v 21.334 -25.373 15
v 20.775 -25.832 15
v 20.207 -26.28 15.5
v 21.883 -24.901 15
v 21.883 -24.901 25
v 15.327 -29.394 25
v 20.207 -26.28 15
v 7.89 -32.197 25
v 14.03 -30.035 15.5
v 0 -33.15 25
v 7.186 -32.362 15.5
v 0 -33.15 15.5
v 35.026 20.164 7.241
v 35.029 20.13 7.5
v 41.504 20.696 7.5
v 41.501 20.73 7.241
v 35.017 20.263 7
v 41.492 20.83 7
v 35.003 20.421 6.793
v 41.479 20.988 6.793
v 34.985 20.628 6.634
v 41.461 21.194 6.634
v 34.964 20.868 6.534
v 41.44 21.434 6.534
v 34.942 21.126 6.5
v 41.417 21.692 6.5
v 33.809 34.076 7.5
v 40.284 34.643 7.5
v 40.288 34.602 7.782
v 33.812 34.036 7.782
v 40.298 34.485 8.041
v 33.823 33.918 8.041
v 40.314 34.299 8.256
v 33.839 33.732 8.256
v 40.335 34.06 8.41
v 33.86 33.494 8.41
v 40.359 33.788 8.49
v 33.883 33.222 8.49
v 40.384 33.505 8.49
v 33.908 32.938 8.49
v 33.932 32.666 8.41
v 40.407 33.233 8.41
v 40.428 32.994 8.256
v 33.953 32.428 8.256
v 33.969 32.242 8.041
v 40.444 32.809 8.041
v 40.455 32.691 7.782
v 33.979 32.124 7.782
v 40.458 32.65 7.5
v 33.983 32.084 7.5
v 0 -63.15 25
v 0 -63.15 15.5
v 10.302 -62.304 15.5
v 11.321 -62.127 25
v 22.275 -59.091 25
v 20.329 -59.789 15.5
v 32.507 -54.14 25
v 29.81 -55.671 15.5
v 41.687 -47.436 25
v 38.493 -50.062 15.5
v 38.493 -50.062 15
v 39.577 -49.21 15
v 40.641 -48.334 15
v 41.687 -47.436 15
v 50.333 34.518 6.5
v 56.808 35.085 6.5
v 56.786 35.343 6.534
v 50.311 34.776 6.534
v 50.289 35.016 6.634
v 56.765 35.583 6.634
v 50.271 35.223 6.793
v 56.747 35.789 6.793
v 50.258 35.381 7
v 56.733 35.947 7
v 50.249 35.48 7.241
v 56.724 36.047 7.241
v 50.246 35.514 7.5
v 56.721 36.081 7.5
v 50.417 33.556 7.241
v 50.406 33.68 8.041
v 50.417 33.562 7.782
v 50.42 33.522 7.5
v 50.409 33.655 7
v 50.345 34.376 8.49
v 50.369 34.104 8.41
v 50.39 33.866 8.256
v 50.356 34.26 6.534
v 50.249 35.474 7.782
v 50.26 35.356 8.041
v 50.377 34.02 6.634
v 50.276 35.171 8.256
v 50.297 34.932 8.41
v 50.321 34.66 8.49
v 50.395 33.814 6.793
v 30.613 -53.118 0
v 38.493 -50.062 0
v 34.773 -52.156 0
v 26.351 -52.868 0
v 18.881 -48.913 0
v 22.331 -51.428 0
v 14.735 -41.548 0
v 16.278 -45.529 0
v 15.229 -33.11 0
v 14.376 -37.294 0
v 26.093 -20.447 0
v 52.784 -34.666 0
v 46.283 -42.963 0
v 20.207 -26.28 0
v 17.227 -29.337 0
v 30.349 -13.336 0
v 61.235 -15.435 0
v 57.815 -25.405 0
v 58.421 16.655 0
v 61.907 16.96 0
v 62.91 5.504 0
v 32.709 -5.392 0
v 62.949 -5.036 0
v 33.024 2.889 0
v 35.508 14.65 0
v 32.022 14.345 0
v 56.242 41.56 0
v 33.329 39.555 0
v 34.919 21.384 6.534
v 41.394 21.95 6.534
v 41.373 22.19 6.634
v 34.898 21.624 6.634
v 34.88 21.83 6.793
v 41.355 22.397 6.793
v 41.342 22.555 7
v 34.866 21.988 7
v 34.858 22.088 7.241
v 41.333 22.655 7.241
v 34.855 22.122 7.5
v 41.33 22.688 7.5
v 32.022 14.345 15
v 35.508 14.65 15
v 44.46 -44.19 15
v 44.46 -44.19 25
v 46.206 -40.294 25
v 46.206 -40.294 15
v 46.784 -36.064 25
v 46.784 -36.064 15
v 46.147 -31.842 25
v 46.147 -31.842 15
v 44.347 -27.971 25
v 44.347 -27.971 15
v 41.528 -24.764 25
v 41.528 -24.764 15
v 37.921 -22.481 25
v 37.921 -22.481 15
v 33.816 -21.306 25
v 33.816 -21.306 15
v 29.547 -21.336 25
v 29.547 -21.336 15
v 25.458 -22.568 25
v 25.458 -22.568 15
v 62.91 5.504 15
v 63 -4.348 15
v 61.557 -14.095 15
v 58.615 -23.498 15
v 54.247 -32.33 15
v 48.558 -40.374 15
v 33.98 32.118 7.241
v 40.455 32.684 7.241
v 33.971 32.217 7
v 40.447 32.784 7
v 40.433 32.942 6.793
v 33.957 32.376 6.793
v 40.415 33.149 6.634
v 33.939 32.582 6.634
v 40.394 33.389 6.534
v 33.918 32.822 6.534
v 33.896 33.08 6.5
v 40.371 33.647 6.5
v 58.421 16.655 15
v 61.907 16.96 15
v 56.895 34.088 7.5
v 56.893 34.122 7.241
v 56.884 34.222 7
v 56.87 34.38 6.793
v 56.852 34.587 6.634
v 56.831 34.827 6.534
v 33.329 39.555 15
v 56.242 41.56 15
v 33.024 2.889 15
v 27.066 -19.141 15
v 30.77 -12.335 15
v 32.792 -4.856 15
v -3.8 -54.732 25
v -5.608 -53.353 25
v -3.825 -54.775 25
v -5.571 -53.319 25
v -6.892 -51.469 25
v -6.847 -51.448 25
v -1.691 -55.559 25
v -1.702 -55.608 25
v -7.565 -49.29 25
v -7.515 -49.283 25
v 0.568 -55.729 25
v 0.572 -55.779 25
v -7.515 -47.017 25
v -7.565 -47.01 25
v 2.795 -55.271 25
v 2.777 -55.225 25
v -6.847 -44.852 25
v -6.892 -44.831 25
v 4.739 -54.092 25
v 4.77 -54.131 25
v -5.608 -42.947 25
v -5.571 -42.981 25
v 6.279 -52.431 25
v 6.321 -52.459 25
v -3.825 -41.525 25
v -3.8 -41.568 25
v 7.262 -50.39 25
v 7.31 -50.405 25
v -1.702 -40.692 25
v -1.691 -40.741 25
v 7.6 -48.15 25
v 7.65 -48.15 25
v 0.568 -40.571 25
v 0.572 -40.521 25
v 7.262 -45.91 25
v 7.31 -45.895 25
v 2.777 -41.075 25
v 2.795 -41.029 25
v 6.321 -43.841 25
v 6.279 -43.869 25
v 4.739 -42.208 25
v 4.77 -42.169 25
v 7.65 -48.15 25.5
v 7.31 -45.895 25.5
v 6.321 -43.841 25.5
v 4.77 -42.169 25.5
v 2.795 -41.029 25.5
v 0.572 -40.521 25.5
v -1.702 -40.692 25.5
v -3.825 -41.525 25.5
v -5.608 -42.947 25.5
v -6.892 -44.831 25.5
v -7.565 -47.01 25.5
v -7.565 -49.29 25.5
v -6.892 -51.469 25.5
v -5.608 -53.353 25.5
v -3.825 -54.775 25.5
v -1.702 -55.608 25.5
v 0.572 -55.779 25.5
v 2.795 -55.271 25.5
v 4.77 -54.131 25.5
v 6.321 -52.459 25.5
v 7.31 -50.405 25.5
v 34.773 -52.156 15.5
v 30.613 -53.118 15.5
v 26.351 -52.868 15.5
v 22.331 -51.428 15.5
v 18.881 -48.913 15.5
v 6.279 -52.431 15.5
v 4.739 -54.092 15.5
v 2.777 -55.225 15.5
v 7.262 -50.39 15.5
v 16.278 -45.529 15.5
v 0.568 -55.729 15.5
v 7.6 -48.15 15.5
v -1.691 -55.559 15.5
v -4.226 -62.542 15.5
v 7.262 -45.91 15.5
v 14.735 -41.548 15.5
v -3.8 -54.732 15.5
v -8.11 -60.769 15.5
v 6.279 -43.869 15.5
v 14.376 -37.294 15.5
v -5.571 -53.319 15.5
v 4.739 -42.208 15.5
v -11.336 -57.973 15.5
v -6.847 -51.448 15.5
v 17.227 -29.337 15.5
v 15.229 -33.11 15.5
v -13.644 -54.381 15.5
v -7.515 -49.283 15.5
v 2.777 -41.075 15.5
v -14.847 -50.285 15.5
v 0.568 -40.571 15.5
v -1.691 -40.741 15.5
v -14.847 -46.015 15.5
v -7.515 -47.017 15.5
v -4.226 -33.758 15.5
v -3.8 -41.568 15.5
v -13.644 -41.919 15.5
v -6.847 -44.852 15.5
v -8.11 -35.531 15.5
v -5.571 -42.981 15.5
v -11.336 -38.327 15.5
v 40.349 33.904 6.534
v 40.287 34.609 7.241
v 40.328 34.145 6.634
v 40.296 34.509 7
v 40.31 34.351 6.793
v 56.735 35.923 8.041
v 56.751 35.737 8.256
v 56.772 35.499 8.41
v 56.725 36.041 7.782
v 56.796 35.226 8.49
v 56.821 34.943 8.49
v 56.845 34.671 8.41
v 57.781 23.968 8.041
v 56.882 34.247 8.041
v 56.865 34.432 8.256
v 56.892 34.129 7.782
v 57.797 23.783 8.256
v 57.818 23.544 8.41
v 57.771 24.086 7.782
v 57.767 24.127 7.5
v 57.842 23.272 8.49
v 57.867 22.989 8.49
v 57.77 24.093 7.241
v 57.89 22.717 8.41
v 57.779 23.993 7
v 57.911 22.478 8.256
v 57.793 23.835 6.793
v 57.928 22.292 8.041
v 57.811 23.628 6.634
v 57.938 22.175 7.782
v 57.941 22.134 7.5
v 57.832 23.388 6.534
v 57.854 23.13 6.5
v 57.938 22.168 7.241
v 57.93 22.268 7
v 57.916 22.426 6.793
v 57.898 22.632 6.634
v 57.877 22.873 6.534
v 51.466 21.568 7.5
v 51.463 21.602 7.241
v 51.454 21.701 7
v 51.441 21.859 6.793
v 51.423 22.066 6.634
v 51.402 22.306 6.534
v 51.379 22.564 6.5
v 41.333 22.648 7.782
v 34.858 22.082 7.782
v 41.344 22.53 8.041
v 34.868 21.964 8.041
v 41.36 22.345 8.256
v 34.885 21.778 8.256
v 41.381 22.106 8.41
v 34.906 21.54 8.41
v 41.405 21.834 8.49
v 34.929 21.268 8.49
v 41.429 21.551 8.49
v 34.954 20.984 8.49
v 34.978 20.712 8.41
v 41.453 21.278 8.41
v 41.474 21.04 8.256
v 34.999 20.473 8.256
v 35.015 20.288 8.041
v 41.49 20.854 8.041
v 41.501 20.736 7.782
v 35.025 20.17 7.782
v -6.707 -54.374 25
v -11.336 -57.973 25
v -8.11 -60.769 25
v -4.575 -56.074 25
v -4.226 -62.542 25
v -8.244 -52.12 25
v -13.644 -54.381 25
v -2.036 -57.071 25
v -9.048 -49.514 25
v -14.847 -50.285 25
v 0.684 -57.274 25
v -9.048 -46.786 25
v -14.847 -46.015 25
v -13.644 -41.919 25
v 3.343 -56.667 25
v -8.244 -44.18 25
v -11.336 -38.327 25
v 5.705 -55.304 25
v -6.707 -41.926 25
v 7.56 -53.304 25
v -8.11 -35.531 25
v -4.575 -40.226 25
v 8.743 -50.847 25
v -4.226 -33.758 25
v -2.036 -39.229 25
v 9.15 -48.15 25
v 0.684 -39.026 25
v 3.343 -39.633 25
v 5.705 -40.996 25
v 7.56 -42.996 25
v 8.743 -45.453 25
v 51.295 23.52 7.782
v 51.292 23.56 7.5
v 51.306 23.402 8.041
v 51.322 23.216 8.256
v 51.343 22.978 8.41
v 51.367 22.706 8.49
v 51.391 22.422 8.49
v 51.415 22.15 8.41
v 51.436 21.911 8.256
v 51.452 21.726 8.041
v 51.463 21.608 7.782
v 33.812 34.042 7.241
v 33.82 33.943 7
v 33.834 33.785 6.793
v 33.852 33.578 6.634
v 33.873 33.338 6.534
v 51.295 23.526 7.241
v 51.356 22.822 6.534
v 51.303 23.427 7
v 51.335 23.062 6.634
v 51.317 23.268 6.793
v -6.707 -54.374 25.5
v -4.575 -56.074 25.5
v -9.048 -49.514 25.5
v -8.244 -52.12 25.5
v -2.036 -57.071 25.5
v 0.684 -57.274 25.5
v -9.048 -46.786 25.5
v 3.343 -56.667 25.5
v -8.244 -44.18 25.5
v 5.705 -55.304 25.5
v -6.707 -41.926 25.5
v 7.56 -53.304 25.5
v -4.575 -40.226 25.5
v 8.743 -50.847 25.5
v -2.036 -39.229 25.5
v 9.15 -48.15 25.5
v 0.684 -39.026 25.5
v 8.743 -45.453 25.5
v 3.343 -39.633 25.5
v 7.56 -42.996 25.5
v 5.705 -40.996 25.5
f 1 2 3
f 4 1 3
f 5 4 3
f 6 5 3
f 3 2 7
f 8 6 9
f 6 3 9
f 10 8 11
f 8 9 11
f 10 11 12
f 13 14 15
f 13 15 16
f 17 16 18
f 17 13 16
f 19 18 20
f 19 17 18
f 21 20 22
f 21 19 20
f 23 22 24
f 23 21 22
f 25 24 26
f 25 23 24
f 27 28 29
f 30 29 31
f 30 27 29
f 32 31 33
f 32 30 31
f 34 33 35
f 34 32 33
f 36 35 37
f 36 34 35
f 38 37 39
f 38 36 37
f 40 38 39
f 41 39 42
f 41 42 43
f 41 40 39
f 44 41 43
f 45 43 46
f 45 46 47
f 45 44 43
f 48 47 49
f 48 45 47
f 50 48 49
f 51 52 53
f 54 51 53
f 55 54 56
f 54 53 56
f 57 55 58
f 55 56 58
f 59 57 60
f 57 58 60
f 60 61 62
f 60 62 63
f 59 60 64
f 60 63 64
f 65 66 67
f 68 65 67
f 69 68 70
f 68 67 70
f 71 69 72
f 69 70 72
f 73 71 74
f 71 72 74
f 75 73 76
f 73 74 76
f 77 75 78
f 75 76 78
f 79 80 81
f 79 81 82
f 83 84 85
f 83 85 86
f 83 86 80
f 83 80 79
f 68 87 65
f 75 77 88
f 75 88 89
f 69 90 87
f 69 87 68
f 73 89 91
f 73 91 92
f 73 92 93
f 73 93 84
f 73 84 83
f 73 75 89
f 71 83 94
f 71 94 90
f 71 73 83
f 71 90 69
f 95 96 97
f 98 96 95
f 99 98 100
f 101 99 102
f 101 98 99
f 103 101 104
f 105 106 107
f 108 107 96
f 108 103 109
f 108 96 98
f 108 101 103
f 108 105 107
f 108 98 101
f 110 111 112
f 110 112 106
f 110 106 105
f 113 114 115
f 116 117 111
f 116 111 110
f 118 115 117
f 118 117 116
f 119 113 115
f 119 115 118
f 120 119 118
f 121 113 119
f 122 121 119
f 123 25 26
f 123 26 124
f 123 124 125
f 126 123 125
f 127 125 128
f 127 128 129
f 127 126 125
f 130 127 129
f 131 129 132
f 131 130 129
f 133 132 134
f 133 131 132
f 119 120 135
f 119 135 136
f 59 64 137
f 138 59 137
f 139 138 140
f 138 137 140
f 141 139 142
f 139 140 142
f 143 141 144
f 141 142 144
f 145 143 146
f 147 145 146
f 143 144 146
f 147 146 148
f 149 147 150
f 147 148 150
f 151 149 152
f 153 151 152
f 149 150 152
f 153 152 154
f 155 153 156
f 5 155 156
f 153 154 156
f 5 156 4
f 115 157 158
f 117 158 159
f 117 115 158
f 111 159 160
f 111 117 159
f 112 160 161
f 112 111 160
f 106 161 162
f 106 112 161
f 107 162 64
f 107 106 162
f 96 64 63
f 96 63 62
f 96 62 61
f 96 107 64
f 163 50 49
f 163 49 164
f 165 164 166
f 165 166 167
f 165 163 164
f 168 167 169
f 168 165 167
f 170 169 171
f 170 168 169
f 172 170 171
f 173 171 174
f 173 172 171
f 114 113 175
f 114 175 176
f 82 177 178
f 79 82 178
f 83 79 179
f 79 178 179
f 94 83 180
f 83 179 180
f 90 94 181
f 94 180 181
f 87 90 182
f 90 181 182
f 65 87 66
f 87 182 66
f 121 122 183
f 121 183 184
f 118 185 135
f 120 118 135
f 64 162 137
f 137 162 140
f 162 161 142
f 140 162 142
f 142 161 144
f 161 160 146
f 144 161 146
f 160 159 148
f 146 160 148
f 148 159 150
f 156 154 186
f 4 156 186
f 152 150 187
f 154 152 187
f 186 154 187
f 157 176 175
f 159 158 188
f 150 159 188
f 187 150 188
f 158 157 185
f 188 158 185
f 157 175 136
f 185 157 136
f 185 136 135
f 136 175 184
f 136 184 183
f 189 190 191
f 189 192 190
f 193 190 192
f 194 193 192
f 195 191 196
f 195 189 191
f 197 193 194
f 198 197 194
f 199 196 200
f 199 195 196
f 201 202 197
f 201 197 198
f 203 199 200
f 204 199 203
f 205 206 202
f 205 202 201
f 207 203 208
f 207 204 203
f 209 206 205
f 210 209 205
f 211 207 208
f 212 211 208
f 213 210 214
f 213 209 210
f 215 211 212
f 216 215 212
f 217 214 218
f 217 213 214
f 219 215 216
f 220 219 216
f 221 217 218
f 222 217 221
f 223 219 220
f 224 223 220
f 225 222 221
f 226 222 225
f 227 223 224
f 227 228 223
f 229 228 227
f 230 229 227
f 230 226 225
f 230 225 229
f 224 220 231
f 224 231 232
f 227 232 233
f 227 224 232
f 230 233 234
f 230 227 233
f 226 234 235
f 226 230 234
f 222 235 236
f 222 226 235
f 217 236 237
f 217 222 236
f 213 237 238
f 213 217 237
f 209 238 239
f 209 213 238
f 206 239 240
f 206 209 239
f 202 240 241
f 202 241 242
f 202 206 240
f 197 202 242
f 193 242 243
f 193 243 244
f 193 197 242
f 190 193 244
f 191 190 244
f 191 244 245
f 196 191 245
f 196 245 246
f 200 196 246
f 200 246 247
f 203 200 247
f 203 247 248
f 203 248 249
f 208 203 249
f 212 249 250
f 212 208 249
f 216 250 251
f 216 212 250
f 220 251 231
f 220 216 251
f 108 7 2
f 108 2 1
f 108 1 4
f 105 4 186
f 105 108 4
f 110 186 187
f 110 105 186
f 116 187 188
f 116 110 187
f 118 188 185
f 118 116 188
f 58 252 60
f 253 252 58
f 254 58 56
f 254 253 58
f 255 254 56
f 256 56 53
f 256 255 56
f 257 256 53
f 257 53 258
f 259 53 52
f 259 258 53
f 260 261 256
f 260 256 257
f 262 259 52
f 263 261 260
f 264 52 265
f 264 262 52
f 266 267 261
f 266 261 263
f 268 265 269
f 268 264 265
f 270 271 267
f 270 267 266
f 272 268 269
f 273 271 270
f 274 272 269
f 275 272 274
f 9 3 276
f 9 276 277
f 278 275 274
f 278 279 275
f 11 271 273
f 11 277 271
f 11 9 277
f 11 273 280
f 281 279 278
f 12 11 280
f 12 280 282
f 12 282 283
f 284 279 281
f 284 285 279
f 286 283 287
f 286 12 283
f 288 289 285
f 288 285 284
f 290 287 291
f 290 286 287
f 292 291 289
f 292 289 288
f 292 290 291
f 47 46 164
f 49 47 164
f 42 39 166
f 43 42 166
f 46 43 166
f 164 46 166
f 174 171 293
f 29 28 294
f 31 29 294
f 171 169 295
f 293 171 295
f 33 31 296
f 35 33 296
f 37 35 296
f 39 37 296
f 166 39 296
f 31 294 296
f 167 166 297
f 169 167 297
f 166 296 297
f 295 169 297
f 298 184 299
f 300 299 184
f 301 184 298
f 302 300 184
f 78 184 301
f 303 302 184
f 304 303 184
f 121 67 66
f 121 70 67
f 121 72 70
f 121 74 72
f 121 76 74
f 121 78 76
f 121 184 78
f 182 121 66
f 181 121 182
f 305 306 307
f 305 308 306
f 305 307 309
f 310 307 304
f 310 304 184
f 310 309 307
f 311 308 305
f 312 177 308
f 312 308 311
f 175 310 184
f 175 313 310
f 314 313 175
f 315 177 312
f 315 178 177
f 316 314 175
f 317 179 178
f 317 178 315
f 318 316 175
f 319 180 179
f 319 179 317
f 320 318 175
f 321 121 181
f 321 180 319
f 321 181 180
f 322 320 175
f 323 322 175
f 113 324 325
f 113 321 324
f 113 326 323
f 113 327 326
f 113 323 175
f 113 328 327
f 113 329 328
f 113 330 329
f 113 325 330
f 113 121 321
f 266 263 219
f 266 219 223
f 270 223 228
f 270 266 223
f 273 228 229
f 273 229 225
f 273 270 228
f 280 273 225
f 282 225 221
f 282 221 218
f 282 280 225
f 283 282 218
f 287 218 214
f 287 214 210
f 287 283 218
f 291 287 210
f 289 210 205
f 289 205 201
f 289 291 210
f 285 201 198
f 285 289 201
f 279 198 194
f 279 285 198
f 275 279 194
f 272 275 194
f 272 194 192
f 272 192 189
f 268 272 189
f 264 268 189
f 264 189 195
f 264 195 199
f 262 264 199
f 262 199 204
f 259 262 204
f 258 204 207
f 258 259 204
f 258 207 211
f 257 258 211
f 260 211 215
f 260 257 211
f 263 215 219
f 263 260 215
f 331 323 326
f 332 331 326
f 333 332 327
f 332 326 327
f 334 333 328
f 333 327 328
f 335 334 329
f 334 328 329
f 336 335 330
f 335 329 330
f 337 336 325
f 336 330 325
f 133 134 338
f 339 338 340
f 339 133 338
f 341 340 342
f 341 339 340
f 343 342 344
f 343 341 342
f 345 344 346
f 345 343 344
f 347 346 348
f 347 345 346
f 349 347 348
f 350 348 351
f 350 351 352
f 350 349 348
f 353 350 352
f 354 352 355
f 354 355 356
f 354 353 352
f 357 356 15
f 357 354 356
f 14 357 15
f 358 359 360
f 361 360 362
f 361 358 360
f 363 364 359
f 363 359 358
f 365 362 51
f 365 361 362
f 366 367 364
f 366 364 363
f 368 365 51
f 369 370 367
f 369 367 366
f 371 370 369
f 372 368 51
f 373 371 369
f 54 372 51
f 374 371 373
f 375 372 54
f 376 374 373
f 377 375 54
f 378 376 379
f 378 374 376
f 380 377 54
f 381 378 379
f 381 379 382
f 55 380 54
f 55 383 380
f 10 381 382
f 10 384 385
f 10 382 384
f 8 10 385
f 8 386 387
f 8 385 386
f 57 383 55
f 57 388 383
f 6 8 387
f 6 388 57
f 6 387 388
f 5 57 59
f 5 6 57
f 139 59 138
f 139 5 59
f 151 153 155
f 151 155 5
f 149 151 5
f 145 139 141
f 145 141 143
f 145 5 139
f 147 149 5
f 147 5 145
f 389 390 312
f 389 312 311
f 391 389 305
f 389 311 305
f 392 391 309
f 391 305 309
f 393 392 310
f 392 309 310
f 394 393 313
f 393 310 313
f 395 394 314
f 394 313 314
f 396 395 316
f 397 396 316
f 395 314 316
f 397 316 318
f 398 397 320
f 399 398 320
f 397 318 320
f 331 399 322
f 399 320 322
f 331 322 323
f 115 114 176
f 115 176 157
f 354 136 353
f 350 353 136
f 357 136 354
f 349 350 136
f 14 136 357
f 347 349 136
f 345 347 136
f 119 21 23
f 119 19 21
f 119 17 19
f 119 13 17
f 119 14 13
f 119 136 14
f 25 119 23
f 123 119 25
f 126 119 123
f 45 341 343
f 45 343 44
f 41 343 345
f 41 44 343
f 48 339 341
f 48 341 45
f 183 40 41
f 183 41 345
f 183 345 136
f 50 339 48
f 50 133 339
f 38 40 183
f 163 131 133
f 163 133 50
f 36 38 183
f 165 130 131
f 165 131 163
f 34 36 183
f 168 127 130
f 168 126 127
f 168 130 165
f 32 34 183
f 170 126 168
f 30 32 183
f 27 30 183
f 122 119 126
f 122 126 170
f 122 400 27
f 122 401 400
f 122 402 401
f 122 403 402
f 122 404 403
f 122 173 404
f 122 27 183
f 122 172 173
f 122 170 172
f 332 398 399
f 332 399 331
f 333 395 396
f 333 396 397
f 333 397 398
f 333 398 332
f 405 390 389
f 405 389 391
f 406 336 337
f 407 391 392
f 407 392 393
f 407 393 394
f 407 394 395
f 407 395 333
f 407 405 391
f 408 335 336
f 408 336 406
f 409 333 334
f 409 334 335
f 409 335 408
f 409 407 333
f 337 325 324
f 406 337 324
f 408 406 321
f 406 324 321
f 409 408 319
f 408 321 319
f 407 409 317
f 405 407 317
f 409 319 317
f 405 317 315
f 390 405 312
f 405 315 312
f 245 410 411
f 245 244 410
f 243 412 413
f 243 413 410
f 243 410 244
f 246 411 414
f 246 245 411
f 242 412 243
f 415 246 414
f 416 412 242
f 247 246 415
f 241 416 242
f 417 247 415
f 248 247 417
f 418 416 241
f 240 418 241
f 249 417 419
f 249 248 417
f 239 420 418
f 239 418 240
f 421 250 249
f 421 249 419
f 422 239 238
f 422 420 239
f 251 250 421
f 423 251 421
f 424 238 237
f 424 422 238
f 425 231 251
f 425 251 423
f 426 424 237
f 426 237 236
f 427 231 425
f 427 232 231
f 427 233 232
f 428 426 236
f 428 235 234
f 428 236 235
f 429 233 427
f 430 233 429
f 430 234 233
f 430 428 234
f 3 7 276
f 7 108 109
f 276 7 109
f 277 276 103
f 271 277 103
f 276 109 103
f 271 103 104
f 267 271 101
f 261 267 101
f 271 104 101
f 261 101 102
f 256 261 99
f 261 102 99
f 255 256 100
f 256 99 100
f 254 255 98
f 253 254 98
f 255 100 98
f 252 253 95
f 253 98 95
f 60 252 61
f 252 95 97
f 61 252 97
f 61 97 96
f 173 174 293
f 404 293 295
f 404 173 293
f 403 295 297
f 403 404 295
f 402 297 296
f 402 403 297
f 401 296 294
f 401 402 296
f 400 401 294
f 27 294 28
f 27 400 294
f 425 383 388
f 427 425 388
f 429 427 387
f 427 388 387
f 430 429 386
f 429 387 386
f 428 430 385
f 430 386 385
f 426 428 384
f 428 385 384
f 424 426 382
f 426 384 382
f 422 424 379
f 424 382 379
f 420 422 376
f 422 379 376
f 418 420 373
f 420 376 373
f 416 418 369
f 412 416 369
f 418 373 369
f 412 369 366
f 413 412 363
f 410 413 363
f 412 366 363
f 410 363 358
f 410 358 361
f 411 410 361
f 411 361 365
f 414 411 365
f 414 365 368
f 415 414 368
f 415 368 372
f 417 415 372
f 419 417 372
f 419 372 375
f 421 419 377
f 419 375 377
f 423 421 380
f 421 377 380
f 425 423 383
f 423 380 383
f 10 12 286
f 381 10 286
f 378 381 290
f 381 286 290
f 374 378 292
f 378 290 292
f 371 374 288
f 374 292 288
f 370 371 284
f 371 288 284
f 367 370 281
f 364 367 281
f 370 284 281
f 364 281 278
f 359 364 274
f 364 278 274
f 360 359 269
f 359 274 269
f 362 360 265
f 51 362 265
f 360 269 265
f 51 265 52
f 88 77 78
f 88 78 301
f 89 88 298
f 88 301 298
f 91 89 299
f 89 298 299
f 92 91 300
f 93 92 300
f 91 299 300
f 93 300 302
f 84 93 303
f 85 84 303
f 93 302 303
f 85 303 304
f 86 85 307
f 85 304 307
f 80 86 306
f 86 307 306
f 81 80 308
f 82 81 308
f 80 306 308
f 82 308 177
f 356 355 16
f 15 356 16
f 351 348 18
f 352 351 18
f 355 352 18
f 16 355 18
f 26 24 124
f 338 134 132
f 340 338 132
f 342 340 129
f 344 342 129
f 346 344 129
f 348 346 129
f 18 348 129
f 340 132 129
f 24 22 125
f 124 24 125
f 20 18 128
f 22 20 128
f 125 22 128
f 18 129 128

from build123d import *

# Parameters (mm, degrees)
SKETCH_396_R           = 7.6
EXTRUDE_924_DEPTH      = 15
CUT_EXTRUDE_1360_DEPTH = 10
SKETCH_1871_R          = 7.6
EXTRUDE_2829_DEPTH     = 10
SKETCH_2885_R          = 7.6
CUT_EXTRUDE_3705_DEPTH = 15.5
SKETCH_7625_R          = 9.15
SKETCH_7625_R_2        = 7.65
EXTRUDE_7744_DEPTH     = 0.5


with BuildPart() as part:
    # Sketch 396 → Extrude 924 (new body)
    with BuildSketch(Plane.XY):
        with BuildLine():
            Line((33.023854242, 2.889212872), (32.0215632, 14.3454519))
            Line((32.0215632, 14.3454519), (35.508244643, 14.650497))
            Line((35.508244643, 14.650497), (33.329351075, 39.555364452))
            Line((33.329351075, 39.555364452), (56.241829131, 41.559946535))
            Line((56.241829131, 41.559946535), (58.4207227, 16.655079083))
            Line((58.4207227, 16.655079083), (61.907404143, 16.960124183))
            Line((61.907404143, 16.960124183), (62.909695184, 5.503885155))
            ThreePointArc((62.909695184, 5.503885155), (46.55906382, -42.663521611), (0, -63.15))
            ThreePointArc((0, -63.15), (-15, -48.15), (0, -33.15))
            ThreePointArc((0, -33.15), (24.440743715, -22.395815382), (33.023854242, 2.889212872))
        make_face()
        with Locations((0, -48.15)):
            Circle(SKETCH_396_R, mode=Mode.SUBTRACT)
    extrude(amount=EXTRUDE_924_DEPTH)

    # Sketch 979 → Cut-Extrude 1360 (cut)
    with BuildSketch(Plane(origin=(62.909695184, 5.503885155, 0), x_dir=(0, 0, -1), z_dir=(0.9961946980917458, 0.08715574274765542, 0))):
        with BuildLine():
            ThreePointArc((-6.5, 30), (-6.792893219, 30.707106781), (-7.5, 31))
            Line((-7.5, 31), (-7.5, 29))
            ThreePointArc((-7.5, 29), (-6.792893219, 29.292893219), (-6.5, 30))
        make_face()
        with BuildLine():
            Line((-7.5, 29), (-7.5, 31))
            ThreePointArc((-7.5, 31), (-8.5, 30), (-7.5, 29))
        make_face()
        with BuildLine():
            ThreePointArc((-6.5, 18), (-6.792893219, 18.707106781), (-7.5, 19))
            Line((-7.5, 19), (-7.5, 17))
            ThreePointArc((-7.5, 17), (-6.792893219, 17.292893219), (-6.5, 18))
        make_face()
        with BuildLine():
            Line((-7.5, 17), (-7.5, 19))
            ThreePointArc((-7.5, 19), (-8.5, 18), (-7.5, 17))
        make_face()
    cut_extrude_1360 = extrude(amount=-CUT_EXTRUDE_1360_DEPTH, mode=Mode.SUBTRACT)

    # Mirror 1436: Cut-Extrude 1360 across plane
    add(cut_extrude_1360.mirror(Plane(origin=(47.966774713, 4.196549013, 0), x_dir=(0, 0, 1), z_dir=(0.9961946980917455, 0.0871557427476578, 0))), mode=Mode.SUBTRACT)

    # Sketch 1871 → Extrude 2829 (add)
    with BuildSketch(Plane.XY.offset(15)):
        with BuildLine():
            ThreePointArc((0, -63.15), (22.275075929, -59.090976404), (41.686650392, -47.43570047))
            ThreePointArc((41.686650392, -47.43570047), (43.052220482, -26.26649599), (21.883016002, -24.9009259))
            ThreePointArc((21.883016002, -24.9009259), (11.693092115, -31.019253647), (0, -33.15))
            ThreePointArc((0, -33.15), (-15, -48.15), (0, -63.15))
        make_face()
        with Locations((0, -48.15)):
            Circle(SKETCH_1871_R, mode=Mode.SUBTRACT)
    extrude(amount=EXTRUDE_2829_DEPTH)

    # Sketch 2885 → Cut-Extrude 3705 (cut)
    with BuildSketch(Plane(origin=(0, 0, 0), x_dir=(-1, 0, 0), z_dir=(0, 0, -1))):
        with BuildLine():
            ThreePointArc((0, -63.15), (15, -48.15), (0, -33.15))
            ThreePointArc((0, -33.15), (-10.671339307, -31.385426831), (-20.206608689, -26.279563643))
            ThreePointArc((-20.206608689, -26.279563643), (-17.458666259, -47.314030755), (-38.493133336, -50.061973453))
            ThreePointArc((-38.493133336, -50.061973453), (-20.328660512, -59.788527844), (0, -63.15))
        make_face()
        with Locations((0, -48.15)):
            Circle(SKETCH_2885_R, mode=Mode.SUBTRACT)
    extrude(amount=-CUT_EXTRUDE_3705_DEPTH, mode=Mode.SUBTRACT)

    # Sketch 7625 → Extrude 7744 (add)
    with BuildSketch(Plane.XY.offset(25)):
        with Locations((0, -48.15)):
            Circle(SKETCH_7625_R)
        with Locations((0, -48.15)):
            Circle(SKETCH_7625_R_2, mode=Mode.SUBTRACT)
    extrude(amount=EXTRUDE_7744_DEPTH)


solid = part.part
